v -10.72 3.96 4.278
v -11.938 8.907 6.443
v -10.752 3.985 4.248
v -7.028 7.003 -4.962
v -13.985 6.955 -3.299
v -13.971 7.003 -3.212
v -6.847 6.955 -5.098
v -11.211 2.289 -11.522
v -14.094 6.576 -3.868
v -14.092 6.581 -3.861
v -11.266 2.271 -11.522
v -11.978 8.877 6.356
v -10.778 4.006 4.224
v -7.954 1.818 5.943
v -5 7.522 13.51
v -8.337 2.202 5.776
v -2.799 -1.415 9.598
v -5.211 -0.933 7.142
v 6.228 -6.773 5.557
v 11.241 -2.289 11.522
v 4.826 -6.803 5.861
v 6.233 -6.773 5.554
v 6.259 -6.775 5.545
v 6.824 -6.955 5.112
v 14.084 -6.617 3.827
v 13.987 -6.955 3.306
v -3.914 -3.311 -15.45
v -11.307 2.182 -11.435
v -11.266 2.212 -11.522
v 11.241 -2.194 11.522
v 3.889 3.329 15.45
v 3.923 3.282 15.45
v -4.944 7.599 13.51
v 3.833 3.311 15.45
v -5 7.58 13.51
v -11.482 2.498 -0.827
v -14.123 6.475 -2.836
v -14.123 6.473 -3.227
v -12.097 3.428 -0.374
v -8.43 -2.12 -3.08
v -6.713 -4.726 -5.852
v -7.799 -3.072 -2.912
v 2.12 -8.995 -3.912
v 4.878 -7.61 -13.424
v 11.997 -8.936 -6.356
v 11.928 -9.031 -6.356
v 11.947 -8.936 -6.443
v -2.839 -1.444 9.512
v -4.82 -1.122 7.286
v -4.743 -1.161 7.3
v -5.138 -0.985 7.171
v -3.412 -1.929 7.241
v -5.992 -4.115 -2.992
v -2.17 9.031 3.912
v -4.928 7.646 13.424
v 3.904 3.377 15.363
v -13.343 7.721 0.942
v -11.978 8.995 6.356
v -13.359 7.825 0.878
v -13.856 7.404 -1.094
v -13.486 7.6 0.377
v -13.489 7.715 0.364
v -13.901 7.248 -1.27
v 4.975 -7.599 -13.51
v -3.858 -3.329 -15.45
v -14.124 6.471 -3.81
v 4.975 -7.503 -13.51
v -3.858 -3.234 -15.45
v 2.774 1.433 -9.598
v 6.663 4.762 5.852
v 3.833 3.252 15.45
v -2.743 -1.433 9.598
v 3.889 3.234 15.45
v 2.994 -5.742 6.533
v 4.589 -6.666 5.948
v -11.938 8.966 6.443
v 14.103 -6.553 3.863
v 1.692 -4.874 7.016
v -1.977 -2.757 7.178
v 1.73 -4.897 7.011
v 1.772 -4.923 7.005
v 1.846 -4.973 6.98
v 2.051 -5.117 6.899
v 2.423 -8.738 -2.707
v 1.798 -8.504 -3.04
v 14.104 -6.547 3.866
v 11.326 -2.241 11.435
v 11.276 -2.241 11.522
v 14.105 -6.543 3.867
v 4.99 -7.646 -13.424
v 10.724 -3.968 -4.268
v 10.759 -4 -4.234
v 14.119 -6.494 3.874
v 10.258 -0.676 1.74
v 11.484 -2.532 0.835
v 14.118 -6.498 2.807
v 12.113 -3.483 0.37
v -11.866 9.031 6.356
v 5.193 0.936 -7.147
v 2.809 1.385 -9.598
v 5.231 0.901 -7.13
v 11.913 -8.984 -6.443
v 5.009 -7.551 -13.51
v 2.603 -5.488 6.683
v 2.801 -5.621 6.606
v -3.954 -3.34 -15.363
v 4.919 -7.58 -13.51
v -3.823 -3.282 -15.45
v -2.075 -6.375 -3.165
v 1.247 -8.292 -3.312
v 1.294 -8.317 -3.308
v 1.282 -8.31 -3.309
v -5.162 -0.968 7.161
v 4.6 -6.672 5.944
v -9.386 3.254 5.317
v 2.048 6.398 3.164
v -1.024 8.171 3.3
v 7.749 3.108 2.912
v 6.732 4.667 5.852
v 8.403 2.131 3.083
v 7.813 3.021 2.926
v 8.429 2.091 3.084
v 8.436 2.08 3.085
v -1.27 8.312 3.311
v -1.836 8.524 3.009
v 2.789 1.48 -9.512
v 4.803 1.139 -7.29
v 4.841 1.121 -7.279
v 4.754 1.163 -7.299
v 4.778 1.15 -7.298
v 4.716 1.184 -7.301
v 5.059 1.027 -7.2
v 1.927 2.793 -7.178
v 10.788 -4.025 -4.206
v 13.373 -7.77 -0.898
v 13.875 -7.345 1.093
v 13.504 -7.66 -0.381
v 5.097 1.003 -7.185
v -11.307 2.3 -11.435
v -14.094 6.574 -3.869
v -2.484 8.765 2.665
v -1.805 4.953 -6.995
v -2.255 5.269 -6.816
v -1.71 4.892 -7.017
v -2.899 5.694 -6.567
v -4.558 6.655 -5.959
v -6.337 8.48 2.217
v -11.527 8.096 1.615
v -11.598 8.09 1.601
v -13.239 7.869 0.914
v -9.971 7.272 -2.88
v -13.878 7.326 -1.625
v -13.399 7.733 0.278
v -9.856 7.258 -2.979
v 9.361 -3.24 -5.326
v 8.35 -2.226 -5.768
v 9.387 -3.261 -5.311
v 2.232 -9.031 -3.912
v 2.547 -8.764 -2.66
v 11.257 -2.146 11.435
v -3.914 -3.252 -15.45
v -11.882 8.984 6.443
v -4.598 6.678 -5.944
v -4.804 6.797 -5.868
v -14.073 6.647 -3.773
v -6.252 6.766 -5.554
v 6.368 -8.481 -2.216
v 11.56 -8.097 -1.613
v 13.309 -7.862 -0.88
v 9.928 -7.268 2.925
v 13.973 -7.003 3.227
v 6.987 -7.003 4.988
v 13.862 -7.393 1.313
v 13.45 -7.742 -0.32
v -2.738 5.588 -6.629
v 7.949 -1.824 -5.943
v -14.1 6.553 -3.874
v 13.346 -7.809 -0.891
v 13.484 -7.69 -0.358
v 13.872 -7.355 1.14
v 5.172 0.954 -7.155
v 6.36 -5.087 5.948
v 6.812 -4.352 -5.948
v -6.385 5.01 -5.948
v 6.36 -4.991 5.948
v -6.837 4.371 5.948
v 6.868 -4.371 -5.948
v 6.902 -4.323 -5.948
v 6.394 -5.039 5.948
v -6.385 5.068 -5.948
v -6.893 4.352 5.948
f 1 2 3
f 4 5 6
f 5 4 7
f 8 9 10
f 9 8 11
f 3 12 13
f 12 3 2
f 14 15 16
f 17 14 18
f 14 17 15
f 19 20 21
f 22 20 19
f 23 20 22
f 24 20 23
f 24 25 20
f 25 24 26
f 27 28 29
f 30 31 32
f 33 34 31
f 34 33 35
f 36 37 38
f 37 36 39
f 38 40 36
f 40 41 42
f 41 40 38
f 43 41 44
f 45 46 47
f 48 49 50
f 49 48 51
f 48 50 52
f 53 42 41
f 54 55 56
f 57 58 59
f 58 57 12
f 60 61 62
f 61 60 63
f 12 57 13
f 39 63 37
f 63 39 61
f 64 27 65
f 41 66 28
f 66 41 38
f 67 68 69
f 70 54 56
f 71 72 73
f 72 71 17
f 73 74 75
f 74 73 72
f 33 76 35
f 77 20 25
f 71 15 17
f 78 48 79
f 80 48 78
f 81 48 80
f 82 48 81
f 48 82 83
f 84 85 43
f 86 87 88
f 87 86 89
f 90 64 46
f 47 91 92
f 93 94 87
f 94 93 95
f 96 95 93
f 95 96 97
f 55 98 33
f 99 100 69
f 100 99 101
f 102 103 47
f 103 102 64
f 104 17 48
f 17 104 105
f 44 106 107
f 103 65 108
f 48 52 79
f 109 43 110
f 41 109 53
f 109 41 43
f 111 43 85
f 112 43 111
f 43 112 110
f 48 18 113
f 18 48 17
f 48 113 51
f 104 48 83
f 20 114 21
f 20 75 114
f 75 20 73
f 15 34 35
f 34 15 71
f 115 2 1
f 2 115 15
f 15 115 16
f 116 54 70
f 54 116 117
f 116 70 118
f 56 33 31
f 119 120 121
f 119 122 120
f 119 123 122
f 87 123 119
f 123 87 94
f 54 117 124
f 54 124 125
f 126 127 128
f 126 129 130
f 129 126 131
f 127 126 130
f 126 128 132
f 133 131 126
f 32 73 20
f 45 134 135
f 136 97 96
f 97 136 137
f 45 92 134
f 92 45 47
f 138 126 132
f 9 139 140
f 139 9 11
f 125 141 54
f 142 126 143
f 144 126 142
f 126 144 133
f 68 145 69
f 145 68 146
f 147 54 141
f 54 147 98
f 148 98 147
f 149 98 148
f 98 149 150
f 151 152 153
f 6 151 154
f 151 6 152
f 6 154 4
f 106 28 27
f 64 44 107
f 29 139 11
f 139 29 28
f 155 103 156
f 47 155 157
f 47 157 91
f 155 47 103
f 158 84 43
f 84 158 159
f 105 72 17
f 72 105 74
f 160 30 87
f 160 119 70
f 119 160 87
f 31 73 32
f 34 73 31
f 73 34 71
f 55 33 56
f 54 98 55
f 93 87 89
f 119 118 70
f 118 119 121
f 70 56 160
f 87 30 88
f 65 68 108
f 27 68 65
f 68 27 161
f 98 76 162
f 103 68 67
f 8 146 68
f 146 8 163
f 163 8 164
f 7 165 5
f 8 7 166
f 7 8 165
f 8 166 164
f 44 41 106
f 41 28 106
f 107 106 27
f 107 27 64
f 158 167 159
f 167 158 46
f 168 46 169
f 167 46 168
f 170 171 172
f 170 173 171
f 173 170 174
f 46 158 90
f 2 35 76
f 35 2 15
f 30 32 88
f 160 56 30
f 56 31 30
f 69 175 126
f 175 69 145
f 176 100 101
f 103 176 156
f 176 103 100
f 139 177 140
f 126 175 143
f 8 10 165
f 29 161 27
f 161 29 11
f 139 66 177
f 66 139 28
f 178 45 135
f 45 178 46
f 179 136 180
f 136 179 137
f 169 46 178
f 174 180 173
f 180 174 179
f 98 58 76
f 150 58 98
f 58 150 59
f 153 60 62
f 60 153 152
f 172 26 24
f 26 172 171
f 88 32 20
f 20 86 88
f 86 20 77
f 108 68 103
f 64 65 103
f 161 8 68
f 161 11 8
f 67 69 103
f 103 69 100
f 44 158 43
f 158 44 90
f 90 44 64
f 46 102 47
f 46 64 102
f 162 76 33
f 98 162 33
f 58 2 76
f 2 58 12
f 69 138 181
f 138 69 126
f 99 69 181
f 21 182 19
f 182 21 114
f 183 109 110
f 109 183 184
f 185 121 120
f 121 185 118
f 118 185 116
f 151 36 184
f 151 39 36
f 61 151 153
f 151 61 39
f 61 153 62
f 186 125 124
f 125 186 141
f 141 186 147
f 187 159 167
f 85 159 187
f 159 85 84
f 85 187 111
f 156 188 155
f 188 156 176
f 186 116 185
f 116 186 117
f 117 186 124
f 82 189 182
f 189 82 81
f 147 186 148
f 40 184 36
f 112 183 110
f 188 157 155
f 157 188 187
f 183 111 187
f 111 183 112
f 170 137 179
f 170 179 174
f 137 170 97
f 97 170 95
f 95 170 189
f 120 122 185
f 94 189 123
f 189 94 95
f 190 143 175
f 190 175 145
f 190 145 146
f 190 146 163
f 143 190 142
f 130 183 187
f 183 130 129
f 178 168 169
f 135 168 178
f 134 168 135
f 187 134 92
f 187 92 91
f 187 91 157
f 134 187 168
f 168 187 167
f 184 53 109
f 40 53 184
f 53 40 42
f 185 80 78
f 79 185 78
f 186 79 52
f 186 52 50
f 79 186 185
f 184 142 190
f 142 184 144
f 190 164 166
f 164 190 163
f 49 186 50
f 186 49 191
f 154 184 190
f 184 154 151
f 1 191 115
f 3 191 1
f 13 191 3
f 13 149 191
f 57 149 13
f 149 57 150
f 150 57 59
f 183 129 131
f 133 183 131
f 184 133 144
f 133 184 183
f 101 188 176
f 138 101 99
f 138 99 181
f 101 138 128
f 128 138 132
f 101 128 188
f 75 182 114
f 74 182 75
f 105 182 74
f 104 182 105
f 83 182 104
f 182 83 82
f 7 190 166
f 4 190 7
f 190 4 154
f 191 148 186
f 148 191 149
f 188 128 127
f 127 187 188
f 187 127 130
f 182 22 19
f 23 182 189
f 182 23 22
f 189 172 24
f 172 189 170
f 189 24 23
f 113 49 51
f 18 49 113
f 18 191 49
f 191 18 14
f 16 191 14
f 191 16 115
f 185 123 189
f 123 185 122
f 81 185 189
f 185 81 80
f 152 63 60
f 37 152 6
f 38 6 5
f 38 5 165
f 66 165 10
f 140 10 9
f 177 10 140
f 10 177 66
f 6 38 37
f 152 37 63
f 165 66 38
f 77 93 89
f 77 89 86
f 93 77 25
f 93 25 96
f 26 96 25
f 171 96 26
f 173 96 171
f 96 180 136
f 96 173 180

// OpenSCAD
// Auto-generated OpenSCAD file

    inner_points = 10*[[-1.3196803278726468, 0.9362046957981746, -6.595639077981762e-13], [1.3196795770729461, -0.9362042464911885, 6.595639077981762e-13], [-0.5584491756654331, 1.4751697470422118, -0.3606158710418413], [1.5768378417073974, -0.039640907689503124, -0.360615871040774], [-1.576838592507098, 0.039641356996489185, 0.360615871040774], [0.5584484248657327, -1.4751692977352255, 0.3606158710418413], [0.41609043726663214, 1.4506701799017077, -0.5834887362276886], [1.231697502166666, 0.8720639963146739, -0.583488736227281], [-1.2316982529663667, -0.8720635470076878, 0.583488736227281], [-0.41609118806633266, -1.4506697305947214, 0.5834887362276886], [0.3400958061980706, 0.4794020290670393, -0.8090169943749945], [-0.34009655699777114, -0.47940157976005326, 0.8090169943749945], [-0.6344438067339944, 0.5039015962075438, -0.5861441291891473], [0.685236145738802, -0.43230287493713776, -0.5861441291884877], [-0.6852368965385024, 0.4323033242441238, 0.5861441291884877], [0.634443055934294, -0.5039011469005578, 0.5861441291891473], [0.07599425566871129, 0.9712683754881611, 0.22552825814730598], [0.8916013205687453, 0.3926621919011276, 0.22552825814771355], [-0.8916020713684457, -0.39266174259414155, -0.22552825814771355], [-0.07599500646841176, -0.9712679261811751, -0.22552825814730598]];

    outer_points = 10*[[0.38730796483642055, 0.32816512550448207, 1.536337911895294], [-0.38730796483642055, -0.32816512550448207, -1.536337911895294], [1.122601014421019, -0.22411714494778695, 1.1434913451842328], [0.49592356320214137, -0.7550994719364139, -1.3423556144673943], [-0.49592356320214137, 0.7550994719364139, 1.3423556144673943], [-1.122601014421019, 0.22411714494778695, -1.1434913451842328], [1.4290986323018988, -0.6907942834915881, 0.3138699504541333], [1.189729145919442, -0.8936114849757331, -0.6356390973021997], [-1.189729145919442, 0.8936114849757331, 0.6356390973021997], [-1.4290986323018988, 0.6907942834915881, -0.3138699504541333], [0.9696619025702452, 0.0, -0.24444998405369595], [-0.9696619025702452, 0.0, 0.24444998405369595], [0.6631642846893652, 0.46667713854380116, 0.5851714106764037], [0.2758563198529447, 0.1385120130393191, -0.9511665012188903], [-0.2758563198529447, -0.1385120130393191, 0.9511665012188903], [-0.6631642846893652, -0.46667713854380116, -0.5851714106764037], [0.45943672973165367, -0.6907942834915881, 0.5583199345078292], [0.2200672433491967, -0.8936114849757331, -0.3911891132485038], [-0.2200672433491967, 0.8936114849757331, 0.3911891132485038], [-0.45943672973165367, 0.6907942834915881, -0.5583199345078292]];

    // Convex hull for inner set (I)
    module inner_hull() {
        hull() {
            for (p = inner_points) {
                translate(p) sphere(r=0.1);
            }
        }
    }

    // Convex hull for outer set (O) minus inner hull (O \ I)
    module outer_minus_inner() {
        difference() {
            hull() {
                for (p = outer_points) {
                    translate(p) sphere(r=0.1);
                }
            }
            inner_hull(); // Subtract inner hull
        }
    }

    // Convex hull for outer set (O) minus all translated inner hulls
    module outer_minus_AllTranslationInner() {
        difference() {
            hull() {
                for (p = outer_points) {
                    translate(p) sphere(r=0.1);
                }
            }
            hull() {
                translate([0,0,50]) inner_hull();
                translate([0,0,-50]) inner_hull();
            }; // Subtract translated inner hulls
        }
    }

    // Difference between outer_minus_inner and outer_minus_AllTranslationInner
    module outer_minus_inner_diff() {
        difference() {
            // Outer minus inner
            difference() {
                hull() {
                    for (p = outer_points) {
                        translate(p) sphere(r=0.1);
                    }
                }
                inner_hull();
            }

            // Subtract Outer minus AllTranslationInner
            difference() {
                hull() {
                    for (p = outer_points) {
                        translate(p) sphere(r=0.1);
                    }
                }
                hull() {
                    translate([0,0,50]) inner_hull();
                    translate([0,0,-50]) inner_hull();
                };
            }
        }
    }

    // Rendering all with colors applied
    color([1, 1, 0, 1]) outer_minus_inner_diff(); // Opaque yellow
    
